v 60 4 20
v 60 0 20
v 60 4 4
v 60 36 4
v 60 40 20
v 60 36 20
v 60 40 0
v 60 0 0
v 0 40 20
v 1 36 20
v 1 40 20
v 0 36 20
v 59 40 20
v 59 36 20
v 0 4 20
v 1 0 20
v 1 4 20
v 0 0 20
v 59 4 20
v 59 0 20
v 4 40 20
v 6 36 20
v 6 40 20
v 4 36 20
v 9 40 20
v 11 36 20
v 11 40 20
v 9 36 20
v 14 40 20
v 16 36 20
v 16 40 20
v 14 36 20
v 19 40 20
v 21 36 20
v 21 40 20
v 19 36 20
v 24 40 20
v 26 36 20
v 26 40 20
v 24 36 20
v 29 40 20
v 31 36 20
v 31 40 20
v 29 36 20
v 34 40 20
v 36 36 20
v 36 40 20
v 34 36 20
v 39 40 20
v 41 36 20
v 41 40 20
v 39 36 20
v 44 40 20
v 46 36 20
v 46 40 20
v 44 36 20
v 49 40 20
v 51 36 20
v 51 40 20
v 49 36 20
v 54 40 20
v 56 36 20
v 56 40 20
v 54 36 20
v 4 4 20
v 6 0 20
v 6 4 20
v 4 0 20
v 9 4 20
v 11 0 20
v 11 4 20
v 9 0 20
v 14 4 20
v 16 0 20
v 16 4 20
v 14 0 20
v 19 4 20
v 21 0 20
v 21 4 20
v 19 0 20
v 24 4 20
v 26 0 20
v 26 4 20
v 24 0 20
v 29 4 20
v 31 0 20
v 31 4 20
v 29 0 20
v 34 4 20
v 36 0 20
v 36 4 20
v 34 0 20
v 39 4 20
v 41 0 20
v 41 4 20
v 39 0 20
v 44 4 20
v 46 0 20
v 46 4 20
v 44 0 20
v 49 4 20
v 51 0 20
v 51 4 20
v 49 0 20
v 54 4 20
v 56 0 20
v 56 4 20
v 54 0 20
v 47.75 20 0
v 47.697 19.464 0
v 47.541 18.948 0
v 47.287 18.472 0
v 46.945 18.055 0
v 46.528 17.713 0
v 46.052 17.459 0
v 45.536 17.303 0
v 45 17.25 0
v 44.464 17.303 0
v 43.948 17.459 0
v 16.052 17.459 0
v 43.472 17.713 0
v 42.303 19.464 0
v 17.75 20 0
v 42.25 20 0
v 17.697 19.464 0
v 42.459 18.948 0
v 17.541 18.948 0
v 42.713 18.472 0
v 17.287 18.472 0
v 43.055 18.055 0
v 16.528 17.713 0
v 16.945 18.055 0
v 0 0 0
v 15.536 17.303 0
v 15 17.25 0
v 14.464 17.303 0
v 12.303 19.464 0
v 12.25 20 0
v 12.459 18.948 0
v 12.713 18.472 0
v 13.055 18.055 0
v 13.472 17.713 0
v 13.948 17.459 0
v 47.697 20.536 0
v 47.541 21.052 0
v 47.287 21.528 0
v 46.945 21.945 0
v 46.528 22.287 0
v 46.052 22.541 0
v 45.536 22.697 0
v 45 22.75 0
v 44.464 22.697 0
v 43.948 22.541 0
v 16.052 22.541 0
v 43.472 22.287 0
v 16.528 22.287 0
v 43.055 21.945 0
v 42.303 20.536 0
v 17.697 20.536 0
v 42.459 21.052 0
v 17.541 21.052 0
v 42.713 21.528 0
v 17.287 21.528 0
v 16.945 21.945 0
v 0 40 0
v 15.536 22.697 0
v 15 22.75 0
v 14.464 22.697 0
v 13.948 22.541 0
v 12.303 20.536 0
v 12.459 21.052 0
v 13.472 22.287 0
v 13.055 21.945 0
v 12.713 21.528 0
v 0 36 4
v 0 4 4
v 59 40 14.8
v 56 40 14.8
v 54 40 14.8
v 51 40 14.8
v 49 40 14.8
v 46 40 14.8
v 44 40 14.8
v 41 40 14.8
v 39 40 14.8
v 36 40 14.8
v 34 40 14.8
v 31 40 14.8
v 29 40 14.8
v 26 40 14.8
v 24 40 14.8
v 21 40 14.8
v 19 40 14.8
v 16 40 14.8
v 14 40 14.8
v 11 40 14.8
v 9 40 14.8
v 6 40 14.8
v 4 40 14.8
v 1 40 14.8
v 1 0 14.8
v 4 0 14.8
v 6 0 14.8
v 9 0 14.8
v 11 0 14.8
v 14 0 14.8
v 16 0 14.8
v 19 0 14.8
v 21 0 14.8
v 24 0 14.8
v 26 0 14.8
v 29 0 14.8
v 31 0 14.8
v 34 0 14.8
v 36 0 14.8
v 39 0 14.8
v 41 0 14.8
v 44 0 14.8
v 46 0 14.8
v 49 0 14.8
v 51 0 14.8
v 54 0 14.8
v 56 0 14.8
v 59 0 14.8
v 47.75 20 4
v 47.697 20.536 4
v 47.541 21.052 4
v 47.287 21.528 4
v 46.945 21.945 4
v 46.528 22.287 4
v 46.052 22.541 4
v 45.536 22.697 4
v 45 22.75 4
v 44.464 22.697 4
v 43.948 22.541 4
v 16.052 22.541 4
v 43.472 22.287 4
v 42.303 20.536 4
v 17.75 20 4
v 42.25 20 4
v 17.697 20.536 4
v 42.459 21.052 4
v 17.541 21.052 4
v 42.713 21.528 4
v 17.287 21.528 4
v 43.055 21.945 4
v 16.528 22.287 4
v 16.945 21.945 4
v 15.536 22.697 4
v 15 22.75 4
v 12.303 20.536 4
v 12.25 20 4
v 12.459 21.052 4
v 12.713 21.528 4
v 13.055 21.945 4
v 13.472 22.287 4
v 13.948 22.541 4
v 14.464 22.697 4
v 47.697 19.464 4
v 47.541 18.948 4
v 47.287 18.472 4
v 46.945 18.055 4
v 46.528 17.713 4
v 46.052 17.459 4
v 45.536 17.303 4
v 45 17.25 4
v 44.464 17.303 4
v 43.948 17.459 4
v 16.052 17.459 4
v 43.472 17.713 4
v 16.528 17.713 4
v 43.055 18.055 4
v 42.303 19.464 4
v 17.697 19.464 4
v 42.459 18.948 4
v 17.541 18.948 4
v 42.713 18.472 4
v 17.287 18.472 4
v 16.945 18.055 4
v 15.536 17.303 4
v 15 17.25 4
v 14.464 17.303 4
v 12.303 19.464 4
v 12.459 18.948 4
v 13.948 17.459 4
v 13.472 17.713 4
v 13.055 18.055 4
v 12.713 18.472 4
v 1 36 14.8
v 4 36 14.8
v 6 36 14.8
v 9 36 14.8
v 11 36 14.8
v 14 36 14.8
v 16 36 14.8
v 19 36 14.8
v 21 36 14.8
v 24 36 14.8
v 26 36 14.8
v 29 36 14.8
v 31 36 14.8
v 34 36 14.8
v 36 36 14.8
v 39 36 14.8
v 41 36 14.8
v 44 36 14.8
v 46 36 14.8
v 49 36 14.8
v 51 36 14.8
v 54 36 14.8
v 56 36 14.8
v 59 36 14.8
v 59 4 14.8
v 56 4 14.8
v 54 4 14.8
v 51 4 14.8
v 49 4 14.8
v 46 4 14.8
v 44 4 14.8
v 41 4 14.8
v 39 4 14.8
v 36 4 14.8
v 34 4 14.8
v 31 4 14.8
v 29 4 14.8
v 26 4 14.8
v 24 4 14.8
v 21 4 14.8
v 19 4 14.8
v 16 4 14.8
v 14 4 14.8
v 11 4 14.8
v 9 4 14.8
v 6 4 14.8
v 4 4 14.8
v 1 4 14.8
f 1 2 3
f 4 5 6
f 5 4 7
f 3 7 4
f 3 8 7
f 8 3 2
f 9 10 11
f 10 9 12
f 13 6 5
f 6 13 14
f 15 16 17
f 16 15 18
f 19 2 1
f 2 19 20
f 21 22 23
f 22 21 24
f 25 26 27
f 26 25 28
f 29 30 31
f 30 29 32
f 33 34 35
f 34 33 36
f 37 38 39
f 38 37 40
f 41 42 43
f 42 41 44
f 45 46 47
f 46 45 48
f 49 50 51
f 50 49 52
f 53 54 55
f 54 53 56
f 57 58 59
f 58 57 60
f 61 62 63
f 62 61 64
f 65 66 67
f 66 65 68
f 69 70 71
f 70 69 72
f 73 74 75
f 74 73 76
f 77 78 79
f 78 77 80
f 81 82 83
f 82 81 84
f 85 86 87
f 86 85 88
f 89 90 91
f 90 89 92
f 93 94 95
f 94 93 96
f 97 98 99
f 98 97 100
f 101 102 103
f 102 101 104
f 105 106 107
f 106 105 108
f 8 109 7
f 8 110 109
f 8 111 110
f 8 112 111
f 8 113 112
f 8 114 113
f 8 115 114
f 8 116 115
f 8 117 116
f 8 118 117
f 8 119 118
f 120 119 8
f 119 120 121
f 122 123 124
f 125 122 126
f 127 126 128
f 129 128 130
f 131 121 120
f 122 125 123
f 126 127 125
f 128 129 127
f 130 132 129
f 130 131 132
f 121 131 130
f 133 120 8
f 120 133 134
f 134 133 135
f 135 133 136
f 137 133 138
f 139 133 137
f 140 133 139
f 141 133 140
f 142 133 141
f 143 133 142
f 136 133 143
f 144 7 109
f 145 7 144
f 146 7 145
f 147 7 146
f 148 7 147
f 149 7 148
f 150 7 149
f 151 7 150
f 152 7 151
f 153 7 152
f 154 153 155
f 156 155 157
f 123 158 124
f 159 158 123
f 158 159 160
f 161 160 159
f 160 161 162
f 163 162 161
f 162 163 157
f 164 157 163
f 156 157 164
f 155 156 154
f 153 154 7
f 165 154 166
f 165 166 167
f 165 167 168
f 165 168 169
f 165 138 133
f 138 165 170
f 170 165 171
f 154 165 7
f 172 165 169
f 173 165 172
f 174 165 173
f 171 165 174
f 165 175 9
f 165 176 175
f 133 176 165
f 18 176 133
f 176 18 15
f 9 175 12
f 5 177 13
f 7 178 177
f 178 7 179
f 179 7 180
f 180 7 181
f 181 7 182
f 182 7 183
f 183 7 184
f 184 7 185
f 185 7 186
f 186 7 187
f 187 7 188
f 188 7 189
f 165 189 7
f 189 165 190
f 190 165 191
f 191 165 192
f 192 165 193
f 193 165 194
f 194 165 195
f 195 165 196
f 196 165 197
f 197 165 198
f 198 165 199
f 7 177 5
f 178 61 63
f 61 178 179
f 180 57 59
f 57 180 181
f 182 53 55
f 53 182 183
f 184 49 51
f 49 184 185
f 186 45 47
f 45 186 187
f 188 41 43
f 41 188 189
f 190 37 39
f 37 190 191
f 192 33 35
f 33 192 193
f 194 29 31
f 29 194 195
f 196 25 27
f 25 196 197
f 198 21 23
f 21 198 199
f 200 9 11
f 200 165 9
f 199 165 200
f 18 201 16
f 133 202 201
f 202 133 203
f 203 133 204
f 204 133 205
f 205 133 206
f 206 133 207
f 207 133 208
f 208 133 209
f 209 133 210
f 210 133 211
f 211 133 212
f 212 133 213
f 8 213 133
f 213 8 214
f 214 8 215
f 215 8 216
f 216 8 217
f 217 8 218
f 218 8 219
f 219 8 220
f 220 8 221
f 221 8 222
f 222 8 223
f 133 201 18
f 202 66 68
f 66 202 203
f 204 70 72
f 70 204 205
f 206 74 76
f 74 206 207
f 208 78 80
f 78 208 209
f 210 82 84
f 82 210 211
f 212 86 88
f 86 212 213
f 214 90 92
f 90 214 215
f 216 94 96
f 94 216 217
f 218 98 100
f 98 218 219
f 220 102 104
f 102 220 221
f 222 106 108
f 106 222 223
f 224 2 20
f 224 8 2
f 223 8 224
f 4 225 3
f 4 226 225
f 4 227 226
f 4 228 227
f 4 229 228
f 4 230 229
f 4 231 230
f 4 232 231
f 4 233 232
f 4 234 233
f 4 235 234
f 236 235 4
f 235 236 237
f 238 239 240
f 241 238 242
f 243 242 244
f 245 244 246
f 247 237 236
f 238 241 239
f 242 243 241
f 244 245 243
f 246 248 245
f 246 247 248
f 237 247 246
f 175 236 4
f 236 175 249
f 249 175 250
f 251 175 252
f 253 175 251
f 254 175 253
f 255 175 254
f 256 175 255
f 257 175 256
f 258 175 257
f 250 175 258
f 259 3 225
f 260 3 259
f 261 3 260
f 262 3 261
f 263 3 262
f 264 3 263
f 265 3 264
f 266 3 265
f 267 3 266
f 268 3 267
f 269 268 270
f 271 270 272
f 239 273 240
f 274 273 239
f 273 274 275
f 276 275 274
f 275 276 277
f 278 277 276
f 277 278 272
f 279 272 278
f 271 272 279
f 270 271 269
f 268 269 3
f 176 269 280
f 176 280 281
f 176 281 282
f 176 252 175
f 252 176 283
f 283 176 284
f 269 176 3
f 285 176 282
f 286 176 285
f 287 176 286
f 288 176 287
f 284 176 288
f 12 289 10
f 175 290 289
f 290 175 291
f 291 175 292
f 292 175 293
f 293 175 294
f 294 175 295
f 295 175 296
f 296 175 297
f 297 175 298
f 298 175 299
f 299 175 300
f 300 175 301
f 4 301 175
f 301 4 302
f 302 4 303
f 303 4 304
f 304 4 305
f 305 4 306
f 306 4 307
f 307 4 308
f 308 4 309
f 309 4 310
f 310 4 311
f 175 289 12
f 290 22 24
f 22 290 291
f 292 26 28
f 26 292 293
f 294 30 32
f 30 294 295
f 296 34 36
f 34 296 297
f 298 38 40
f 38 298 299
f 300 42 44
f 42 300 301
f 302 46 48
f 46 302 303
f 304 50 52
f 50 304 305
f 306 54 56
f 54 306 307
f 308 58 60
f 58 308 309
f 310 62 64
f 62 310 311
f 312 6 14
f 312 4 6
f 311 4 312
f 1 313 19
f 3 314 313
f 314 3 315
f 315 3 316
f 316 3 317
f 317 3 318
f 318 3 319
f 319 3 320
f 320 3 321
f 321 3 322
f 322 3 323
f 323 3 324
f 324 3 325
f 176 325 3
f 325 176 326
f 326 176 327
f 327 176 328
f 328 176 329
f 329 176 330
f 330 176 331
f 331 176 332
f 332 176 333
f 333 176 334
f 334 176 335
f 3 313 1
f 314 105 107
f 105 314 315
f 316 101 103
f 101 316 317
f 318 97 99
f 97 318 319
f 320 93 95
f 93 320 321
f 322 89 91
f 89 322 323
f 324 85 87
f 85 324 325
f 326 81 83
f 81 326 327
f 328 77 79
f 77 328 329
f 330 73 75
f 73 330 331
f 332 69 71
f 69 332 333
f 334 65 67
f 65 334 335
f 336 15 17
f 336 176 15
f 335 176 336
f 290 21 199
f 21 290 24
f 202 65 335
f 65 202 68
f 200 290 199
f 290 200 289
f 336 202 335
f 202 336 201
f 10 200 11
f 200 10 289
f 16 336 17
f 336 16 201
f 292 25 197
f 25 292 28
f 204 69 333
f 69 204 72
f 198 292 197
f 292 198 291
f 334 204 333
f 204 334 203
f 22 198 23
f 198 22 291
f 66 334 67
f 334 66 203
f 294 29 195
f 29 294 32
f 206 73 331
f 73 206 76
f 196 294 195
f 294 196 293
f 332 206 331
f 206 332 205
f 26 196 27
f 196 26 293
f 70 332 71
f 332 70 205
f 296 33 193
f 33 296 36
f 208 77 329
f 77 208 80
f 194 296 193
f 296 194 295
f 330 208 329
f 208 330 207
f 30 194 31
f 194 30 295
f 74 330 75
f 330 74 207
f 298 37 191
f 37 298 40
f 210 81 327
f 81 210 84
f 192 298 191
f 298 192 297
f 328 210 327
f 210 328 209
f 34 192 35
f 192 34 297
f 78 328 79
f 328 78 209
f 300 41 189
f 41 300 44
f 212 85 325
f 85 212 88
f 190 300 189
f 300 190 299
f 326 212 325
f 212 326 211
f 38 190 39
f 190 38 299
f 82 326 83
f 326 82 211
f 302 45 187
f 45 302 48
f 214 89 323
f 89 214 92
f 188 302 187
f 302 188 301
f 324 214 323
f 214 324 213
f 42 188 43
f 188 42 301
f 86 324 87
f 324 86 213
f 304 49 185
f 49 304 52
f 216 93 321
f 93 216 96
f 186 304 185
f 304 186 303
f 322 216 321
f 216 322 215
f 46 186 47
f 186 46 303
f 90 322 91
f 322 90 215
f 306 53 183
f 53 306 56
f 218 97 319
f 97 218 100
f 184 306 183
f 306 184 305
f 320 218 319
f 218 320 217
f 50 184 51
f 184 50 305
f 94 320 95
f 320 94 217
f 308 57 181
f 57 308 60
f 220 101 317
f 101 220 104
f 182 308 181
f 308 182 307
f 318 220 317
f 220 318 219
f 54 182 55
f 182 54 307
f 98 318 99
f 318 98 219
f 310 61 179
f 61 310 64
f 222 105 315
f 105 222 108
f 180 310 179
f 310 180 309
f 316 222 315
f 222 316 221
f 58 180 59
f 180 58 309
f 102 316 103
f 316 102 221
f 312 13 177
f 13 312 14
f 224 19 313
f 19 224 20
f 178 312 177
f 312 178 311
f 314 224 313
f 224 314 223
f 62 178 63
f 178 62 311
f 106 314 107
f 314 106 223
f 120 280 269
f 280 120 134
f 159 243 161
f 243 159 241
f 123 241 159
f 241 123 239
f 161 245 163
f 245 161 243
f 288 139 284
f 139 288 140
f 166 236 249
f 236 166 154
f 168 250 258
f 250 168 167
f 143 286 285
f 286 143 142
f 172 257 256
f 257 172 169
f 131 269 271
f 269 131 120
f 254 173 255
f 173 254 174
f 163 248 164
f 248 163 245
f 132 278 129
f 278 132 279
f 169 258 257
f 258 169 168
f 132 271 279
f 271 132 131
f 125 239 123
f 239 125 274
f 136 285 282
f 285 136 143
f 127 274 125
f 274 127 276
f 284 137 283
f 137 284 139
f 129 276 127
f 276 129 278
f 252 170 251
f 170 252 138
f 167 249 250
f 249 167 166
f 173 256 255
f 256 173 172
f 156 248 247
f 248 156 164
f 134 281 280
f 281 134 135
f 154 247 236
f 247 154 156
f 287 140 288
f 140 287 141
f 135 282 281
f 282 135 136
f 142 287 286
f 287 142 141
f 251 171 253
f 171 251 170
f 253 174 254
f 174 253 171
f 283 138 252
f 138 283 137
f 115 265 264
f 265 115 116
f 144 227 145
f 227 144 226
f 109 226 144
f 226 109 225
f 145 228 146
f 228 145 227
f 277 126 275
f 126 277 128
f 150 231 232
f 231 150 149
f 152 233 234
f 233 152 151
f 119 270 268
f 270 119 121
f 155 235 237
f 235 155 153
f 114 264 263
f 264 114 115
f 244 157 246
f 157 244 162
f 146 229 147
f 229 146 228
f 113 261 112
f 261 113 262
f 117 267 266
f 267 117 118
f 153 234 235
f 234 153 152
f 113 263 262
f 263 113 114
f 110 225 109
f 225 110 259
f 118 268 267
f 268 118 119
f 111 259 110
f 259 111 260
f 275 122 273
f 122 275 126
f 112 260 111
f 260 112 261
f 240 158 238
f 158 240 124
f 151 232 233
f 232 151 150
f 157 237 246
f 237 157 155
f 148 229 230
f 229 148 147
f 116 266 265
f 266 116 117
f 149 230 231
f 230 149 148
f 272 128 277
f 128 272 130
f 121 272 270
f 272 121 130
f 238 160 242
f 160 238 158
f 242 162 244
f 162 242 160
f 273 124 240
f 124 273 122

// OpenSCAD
$fn = 32;

// ----------------------------------------------------------------------
// Cable duct: 60 x 40 x 20 mm, 12 fingers
// ----------------------------------------------------------------------

// --- parameters (mm) ---
channel_l = 60;           // duct length, X
channel_w = 40;           // duct width, Y
channel_h = 20;           // duct height, Z
channel_t = 4;            // side wall thickness
floor_t = 4;              // floor thickness
slot_w = 3;               // finger slot width
slot_h = 10.8;            // finger slot height
fingers = 12;             // number of finger slots per side
pitch = 5;                // finger pitch
hole_d = 5.5;             // floor mounting hole
hole_n = 2;               // mounting holes in the floor

module shell() {
  difference() {
    cube([channel_l, channel_w, channel_h]);
    /* open top channel */
    translate([-channel_t - 1, channel_t, floor_t])
      cube([channel_l + 2 * channel_t + 2, channel_w - 2 * channel_t, channel_h + 1]);
  }
}

difference() {
  union() {
    shell();
  }
  /* finger slots cut through both side walls */
  for (i = [0 : fingers - 1]) translate([pitch / 2 + i * pitch - slot_w / 2, -1, floor_t + slot_h]) cube([slot_w, channel_w + 2, channel_h]);
  for (i = [0 : hole_n - 1]) translate([(channel_l / hole_n) * (i + 0.5), channel_w / 2, -1]) cylinder(h = floor_t + 2, d = hole_d);
}
